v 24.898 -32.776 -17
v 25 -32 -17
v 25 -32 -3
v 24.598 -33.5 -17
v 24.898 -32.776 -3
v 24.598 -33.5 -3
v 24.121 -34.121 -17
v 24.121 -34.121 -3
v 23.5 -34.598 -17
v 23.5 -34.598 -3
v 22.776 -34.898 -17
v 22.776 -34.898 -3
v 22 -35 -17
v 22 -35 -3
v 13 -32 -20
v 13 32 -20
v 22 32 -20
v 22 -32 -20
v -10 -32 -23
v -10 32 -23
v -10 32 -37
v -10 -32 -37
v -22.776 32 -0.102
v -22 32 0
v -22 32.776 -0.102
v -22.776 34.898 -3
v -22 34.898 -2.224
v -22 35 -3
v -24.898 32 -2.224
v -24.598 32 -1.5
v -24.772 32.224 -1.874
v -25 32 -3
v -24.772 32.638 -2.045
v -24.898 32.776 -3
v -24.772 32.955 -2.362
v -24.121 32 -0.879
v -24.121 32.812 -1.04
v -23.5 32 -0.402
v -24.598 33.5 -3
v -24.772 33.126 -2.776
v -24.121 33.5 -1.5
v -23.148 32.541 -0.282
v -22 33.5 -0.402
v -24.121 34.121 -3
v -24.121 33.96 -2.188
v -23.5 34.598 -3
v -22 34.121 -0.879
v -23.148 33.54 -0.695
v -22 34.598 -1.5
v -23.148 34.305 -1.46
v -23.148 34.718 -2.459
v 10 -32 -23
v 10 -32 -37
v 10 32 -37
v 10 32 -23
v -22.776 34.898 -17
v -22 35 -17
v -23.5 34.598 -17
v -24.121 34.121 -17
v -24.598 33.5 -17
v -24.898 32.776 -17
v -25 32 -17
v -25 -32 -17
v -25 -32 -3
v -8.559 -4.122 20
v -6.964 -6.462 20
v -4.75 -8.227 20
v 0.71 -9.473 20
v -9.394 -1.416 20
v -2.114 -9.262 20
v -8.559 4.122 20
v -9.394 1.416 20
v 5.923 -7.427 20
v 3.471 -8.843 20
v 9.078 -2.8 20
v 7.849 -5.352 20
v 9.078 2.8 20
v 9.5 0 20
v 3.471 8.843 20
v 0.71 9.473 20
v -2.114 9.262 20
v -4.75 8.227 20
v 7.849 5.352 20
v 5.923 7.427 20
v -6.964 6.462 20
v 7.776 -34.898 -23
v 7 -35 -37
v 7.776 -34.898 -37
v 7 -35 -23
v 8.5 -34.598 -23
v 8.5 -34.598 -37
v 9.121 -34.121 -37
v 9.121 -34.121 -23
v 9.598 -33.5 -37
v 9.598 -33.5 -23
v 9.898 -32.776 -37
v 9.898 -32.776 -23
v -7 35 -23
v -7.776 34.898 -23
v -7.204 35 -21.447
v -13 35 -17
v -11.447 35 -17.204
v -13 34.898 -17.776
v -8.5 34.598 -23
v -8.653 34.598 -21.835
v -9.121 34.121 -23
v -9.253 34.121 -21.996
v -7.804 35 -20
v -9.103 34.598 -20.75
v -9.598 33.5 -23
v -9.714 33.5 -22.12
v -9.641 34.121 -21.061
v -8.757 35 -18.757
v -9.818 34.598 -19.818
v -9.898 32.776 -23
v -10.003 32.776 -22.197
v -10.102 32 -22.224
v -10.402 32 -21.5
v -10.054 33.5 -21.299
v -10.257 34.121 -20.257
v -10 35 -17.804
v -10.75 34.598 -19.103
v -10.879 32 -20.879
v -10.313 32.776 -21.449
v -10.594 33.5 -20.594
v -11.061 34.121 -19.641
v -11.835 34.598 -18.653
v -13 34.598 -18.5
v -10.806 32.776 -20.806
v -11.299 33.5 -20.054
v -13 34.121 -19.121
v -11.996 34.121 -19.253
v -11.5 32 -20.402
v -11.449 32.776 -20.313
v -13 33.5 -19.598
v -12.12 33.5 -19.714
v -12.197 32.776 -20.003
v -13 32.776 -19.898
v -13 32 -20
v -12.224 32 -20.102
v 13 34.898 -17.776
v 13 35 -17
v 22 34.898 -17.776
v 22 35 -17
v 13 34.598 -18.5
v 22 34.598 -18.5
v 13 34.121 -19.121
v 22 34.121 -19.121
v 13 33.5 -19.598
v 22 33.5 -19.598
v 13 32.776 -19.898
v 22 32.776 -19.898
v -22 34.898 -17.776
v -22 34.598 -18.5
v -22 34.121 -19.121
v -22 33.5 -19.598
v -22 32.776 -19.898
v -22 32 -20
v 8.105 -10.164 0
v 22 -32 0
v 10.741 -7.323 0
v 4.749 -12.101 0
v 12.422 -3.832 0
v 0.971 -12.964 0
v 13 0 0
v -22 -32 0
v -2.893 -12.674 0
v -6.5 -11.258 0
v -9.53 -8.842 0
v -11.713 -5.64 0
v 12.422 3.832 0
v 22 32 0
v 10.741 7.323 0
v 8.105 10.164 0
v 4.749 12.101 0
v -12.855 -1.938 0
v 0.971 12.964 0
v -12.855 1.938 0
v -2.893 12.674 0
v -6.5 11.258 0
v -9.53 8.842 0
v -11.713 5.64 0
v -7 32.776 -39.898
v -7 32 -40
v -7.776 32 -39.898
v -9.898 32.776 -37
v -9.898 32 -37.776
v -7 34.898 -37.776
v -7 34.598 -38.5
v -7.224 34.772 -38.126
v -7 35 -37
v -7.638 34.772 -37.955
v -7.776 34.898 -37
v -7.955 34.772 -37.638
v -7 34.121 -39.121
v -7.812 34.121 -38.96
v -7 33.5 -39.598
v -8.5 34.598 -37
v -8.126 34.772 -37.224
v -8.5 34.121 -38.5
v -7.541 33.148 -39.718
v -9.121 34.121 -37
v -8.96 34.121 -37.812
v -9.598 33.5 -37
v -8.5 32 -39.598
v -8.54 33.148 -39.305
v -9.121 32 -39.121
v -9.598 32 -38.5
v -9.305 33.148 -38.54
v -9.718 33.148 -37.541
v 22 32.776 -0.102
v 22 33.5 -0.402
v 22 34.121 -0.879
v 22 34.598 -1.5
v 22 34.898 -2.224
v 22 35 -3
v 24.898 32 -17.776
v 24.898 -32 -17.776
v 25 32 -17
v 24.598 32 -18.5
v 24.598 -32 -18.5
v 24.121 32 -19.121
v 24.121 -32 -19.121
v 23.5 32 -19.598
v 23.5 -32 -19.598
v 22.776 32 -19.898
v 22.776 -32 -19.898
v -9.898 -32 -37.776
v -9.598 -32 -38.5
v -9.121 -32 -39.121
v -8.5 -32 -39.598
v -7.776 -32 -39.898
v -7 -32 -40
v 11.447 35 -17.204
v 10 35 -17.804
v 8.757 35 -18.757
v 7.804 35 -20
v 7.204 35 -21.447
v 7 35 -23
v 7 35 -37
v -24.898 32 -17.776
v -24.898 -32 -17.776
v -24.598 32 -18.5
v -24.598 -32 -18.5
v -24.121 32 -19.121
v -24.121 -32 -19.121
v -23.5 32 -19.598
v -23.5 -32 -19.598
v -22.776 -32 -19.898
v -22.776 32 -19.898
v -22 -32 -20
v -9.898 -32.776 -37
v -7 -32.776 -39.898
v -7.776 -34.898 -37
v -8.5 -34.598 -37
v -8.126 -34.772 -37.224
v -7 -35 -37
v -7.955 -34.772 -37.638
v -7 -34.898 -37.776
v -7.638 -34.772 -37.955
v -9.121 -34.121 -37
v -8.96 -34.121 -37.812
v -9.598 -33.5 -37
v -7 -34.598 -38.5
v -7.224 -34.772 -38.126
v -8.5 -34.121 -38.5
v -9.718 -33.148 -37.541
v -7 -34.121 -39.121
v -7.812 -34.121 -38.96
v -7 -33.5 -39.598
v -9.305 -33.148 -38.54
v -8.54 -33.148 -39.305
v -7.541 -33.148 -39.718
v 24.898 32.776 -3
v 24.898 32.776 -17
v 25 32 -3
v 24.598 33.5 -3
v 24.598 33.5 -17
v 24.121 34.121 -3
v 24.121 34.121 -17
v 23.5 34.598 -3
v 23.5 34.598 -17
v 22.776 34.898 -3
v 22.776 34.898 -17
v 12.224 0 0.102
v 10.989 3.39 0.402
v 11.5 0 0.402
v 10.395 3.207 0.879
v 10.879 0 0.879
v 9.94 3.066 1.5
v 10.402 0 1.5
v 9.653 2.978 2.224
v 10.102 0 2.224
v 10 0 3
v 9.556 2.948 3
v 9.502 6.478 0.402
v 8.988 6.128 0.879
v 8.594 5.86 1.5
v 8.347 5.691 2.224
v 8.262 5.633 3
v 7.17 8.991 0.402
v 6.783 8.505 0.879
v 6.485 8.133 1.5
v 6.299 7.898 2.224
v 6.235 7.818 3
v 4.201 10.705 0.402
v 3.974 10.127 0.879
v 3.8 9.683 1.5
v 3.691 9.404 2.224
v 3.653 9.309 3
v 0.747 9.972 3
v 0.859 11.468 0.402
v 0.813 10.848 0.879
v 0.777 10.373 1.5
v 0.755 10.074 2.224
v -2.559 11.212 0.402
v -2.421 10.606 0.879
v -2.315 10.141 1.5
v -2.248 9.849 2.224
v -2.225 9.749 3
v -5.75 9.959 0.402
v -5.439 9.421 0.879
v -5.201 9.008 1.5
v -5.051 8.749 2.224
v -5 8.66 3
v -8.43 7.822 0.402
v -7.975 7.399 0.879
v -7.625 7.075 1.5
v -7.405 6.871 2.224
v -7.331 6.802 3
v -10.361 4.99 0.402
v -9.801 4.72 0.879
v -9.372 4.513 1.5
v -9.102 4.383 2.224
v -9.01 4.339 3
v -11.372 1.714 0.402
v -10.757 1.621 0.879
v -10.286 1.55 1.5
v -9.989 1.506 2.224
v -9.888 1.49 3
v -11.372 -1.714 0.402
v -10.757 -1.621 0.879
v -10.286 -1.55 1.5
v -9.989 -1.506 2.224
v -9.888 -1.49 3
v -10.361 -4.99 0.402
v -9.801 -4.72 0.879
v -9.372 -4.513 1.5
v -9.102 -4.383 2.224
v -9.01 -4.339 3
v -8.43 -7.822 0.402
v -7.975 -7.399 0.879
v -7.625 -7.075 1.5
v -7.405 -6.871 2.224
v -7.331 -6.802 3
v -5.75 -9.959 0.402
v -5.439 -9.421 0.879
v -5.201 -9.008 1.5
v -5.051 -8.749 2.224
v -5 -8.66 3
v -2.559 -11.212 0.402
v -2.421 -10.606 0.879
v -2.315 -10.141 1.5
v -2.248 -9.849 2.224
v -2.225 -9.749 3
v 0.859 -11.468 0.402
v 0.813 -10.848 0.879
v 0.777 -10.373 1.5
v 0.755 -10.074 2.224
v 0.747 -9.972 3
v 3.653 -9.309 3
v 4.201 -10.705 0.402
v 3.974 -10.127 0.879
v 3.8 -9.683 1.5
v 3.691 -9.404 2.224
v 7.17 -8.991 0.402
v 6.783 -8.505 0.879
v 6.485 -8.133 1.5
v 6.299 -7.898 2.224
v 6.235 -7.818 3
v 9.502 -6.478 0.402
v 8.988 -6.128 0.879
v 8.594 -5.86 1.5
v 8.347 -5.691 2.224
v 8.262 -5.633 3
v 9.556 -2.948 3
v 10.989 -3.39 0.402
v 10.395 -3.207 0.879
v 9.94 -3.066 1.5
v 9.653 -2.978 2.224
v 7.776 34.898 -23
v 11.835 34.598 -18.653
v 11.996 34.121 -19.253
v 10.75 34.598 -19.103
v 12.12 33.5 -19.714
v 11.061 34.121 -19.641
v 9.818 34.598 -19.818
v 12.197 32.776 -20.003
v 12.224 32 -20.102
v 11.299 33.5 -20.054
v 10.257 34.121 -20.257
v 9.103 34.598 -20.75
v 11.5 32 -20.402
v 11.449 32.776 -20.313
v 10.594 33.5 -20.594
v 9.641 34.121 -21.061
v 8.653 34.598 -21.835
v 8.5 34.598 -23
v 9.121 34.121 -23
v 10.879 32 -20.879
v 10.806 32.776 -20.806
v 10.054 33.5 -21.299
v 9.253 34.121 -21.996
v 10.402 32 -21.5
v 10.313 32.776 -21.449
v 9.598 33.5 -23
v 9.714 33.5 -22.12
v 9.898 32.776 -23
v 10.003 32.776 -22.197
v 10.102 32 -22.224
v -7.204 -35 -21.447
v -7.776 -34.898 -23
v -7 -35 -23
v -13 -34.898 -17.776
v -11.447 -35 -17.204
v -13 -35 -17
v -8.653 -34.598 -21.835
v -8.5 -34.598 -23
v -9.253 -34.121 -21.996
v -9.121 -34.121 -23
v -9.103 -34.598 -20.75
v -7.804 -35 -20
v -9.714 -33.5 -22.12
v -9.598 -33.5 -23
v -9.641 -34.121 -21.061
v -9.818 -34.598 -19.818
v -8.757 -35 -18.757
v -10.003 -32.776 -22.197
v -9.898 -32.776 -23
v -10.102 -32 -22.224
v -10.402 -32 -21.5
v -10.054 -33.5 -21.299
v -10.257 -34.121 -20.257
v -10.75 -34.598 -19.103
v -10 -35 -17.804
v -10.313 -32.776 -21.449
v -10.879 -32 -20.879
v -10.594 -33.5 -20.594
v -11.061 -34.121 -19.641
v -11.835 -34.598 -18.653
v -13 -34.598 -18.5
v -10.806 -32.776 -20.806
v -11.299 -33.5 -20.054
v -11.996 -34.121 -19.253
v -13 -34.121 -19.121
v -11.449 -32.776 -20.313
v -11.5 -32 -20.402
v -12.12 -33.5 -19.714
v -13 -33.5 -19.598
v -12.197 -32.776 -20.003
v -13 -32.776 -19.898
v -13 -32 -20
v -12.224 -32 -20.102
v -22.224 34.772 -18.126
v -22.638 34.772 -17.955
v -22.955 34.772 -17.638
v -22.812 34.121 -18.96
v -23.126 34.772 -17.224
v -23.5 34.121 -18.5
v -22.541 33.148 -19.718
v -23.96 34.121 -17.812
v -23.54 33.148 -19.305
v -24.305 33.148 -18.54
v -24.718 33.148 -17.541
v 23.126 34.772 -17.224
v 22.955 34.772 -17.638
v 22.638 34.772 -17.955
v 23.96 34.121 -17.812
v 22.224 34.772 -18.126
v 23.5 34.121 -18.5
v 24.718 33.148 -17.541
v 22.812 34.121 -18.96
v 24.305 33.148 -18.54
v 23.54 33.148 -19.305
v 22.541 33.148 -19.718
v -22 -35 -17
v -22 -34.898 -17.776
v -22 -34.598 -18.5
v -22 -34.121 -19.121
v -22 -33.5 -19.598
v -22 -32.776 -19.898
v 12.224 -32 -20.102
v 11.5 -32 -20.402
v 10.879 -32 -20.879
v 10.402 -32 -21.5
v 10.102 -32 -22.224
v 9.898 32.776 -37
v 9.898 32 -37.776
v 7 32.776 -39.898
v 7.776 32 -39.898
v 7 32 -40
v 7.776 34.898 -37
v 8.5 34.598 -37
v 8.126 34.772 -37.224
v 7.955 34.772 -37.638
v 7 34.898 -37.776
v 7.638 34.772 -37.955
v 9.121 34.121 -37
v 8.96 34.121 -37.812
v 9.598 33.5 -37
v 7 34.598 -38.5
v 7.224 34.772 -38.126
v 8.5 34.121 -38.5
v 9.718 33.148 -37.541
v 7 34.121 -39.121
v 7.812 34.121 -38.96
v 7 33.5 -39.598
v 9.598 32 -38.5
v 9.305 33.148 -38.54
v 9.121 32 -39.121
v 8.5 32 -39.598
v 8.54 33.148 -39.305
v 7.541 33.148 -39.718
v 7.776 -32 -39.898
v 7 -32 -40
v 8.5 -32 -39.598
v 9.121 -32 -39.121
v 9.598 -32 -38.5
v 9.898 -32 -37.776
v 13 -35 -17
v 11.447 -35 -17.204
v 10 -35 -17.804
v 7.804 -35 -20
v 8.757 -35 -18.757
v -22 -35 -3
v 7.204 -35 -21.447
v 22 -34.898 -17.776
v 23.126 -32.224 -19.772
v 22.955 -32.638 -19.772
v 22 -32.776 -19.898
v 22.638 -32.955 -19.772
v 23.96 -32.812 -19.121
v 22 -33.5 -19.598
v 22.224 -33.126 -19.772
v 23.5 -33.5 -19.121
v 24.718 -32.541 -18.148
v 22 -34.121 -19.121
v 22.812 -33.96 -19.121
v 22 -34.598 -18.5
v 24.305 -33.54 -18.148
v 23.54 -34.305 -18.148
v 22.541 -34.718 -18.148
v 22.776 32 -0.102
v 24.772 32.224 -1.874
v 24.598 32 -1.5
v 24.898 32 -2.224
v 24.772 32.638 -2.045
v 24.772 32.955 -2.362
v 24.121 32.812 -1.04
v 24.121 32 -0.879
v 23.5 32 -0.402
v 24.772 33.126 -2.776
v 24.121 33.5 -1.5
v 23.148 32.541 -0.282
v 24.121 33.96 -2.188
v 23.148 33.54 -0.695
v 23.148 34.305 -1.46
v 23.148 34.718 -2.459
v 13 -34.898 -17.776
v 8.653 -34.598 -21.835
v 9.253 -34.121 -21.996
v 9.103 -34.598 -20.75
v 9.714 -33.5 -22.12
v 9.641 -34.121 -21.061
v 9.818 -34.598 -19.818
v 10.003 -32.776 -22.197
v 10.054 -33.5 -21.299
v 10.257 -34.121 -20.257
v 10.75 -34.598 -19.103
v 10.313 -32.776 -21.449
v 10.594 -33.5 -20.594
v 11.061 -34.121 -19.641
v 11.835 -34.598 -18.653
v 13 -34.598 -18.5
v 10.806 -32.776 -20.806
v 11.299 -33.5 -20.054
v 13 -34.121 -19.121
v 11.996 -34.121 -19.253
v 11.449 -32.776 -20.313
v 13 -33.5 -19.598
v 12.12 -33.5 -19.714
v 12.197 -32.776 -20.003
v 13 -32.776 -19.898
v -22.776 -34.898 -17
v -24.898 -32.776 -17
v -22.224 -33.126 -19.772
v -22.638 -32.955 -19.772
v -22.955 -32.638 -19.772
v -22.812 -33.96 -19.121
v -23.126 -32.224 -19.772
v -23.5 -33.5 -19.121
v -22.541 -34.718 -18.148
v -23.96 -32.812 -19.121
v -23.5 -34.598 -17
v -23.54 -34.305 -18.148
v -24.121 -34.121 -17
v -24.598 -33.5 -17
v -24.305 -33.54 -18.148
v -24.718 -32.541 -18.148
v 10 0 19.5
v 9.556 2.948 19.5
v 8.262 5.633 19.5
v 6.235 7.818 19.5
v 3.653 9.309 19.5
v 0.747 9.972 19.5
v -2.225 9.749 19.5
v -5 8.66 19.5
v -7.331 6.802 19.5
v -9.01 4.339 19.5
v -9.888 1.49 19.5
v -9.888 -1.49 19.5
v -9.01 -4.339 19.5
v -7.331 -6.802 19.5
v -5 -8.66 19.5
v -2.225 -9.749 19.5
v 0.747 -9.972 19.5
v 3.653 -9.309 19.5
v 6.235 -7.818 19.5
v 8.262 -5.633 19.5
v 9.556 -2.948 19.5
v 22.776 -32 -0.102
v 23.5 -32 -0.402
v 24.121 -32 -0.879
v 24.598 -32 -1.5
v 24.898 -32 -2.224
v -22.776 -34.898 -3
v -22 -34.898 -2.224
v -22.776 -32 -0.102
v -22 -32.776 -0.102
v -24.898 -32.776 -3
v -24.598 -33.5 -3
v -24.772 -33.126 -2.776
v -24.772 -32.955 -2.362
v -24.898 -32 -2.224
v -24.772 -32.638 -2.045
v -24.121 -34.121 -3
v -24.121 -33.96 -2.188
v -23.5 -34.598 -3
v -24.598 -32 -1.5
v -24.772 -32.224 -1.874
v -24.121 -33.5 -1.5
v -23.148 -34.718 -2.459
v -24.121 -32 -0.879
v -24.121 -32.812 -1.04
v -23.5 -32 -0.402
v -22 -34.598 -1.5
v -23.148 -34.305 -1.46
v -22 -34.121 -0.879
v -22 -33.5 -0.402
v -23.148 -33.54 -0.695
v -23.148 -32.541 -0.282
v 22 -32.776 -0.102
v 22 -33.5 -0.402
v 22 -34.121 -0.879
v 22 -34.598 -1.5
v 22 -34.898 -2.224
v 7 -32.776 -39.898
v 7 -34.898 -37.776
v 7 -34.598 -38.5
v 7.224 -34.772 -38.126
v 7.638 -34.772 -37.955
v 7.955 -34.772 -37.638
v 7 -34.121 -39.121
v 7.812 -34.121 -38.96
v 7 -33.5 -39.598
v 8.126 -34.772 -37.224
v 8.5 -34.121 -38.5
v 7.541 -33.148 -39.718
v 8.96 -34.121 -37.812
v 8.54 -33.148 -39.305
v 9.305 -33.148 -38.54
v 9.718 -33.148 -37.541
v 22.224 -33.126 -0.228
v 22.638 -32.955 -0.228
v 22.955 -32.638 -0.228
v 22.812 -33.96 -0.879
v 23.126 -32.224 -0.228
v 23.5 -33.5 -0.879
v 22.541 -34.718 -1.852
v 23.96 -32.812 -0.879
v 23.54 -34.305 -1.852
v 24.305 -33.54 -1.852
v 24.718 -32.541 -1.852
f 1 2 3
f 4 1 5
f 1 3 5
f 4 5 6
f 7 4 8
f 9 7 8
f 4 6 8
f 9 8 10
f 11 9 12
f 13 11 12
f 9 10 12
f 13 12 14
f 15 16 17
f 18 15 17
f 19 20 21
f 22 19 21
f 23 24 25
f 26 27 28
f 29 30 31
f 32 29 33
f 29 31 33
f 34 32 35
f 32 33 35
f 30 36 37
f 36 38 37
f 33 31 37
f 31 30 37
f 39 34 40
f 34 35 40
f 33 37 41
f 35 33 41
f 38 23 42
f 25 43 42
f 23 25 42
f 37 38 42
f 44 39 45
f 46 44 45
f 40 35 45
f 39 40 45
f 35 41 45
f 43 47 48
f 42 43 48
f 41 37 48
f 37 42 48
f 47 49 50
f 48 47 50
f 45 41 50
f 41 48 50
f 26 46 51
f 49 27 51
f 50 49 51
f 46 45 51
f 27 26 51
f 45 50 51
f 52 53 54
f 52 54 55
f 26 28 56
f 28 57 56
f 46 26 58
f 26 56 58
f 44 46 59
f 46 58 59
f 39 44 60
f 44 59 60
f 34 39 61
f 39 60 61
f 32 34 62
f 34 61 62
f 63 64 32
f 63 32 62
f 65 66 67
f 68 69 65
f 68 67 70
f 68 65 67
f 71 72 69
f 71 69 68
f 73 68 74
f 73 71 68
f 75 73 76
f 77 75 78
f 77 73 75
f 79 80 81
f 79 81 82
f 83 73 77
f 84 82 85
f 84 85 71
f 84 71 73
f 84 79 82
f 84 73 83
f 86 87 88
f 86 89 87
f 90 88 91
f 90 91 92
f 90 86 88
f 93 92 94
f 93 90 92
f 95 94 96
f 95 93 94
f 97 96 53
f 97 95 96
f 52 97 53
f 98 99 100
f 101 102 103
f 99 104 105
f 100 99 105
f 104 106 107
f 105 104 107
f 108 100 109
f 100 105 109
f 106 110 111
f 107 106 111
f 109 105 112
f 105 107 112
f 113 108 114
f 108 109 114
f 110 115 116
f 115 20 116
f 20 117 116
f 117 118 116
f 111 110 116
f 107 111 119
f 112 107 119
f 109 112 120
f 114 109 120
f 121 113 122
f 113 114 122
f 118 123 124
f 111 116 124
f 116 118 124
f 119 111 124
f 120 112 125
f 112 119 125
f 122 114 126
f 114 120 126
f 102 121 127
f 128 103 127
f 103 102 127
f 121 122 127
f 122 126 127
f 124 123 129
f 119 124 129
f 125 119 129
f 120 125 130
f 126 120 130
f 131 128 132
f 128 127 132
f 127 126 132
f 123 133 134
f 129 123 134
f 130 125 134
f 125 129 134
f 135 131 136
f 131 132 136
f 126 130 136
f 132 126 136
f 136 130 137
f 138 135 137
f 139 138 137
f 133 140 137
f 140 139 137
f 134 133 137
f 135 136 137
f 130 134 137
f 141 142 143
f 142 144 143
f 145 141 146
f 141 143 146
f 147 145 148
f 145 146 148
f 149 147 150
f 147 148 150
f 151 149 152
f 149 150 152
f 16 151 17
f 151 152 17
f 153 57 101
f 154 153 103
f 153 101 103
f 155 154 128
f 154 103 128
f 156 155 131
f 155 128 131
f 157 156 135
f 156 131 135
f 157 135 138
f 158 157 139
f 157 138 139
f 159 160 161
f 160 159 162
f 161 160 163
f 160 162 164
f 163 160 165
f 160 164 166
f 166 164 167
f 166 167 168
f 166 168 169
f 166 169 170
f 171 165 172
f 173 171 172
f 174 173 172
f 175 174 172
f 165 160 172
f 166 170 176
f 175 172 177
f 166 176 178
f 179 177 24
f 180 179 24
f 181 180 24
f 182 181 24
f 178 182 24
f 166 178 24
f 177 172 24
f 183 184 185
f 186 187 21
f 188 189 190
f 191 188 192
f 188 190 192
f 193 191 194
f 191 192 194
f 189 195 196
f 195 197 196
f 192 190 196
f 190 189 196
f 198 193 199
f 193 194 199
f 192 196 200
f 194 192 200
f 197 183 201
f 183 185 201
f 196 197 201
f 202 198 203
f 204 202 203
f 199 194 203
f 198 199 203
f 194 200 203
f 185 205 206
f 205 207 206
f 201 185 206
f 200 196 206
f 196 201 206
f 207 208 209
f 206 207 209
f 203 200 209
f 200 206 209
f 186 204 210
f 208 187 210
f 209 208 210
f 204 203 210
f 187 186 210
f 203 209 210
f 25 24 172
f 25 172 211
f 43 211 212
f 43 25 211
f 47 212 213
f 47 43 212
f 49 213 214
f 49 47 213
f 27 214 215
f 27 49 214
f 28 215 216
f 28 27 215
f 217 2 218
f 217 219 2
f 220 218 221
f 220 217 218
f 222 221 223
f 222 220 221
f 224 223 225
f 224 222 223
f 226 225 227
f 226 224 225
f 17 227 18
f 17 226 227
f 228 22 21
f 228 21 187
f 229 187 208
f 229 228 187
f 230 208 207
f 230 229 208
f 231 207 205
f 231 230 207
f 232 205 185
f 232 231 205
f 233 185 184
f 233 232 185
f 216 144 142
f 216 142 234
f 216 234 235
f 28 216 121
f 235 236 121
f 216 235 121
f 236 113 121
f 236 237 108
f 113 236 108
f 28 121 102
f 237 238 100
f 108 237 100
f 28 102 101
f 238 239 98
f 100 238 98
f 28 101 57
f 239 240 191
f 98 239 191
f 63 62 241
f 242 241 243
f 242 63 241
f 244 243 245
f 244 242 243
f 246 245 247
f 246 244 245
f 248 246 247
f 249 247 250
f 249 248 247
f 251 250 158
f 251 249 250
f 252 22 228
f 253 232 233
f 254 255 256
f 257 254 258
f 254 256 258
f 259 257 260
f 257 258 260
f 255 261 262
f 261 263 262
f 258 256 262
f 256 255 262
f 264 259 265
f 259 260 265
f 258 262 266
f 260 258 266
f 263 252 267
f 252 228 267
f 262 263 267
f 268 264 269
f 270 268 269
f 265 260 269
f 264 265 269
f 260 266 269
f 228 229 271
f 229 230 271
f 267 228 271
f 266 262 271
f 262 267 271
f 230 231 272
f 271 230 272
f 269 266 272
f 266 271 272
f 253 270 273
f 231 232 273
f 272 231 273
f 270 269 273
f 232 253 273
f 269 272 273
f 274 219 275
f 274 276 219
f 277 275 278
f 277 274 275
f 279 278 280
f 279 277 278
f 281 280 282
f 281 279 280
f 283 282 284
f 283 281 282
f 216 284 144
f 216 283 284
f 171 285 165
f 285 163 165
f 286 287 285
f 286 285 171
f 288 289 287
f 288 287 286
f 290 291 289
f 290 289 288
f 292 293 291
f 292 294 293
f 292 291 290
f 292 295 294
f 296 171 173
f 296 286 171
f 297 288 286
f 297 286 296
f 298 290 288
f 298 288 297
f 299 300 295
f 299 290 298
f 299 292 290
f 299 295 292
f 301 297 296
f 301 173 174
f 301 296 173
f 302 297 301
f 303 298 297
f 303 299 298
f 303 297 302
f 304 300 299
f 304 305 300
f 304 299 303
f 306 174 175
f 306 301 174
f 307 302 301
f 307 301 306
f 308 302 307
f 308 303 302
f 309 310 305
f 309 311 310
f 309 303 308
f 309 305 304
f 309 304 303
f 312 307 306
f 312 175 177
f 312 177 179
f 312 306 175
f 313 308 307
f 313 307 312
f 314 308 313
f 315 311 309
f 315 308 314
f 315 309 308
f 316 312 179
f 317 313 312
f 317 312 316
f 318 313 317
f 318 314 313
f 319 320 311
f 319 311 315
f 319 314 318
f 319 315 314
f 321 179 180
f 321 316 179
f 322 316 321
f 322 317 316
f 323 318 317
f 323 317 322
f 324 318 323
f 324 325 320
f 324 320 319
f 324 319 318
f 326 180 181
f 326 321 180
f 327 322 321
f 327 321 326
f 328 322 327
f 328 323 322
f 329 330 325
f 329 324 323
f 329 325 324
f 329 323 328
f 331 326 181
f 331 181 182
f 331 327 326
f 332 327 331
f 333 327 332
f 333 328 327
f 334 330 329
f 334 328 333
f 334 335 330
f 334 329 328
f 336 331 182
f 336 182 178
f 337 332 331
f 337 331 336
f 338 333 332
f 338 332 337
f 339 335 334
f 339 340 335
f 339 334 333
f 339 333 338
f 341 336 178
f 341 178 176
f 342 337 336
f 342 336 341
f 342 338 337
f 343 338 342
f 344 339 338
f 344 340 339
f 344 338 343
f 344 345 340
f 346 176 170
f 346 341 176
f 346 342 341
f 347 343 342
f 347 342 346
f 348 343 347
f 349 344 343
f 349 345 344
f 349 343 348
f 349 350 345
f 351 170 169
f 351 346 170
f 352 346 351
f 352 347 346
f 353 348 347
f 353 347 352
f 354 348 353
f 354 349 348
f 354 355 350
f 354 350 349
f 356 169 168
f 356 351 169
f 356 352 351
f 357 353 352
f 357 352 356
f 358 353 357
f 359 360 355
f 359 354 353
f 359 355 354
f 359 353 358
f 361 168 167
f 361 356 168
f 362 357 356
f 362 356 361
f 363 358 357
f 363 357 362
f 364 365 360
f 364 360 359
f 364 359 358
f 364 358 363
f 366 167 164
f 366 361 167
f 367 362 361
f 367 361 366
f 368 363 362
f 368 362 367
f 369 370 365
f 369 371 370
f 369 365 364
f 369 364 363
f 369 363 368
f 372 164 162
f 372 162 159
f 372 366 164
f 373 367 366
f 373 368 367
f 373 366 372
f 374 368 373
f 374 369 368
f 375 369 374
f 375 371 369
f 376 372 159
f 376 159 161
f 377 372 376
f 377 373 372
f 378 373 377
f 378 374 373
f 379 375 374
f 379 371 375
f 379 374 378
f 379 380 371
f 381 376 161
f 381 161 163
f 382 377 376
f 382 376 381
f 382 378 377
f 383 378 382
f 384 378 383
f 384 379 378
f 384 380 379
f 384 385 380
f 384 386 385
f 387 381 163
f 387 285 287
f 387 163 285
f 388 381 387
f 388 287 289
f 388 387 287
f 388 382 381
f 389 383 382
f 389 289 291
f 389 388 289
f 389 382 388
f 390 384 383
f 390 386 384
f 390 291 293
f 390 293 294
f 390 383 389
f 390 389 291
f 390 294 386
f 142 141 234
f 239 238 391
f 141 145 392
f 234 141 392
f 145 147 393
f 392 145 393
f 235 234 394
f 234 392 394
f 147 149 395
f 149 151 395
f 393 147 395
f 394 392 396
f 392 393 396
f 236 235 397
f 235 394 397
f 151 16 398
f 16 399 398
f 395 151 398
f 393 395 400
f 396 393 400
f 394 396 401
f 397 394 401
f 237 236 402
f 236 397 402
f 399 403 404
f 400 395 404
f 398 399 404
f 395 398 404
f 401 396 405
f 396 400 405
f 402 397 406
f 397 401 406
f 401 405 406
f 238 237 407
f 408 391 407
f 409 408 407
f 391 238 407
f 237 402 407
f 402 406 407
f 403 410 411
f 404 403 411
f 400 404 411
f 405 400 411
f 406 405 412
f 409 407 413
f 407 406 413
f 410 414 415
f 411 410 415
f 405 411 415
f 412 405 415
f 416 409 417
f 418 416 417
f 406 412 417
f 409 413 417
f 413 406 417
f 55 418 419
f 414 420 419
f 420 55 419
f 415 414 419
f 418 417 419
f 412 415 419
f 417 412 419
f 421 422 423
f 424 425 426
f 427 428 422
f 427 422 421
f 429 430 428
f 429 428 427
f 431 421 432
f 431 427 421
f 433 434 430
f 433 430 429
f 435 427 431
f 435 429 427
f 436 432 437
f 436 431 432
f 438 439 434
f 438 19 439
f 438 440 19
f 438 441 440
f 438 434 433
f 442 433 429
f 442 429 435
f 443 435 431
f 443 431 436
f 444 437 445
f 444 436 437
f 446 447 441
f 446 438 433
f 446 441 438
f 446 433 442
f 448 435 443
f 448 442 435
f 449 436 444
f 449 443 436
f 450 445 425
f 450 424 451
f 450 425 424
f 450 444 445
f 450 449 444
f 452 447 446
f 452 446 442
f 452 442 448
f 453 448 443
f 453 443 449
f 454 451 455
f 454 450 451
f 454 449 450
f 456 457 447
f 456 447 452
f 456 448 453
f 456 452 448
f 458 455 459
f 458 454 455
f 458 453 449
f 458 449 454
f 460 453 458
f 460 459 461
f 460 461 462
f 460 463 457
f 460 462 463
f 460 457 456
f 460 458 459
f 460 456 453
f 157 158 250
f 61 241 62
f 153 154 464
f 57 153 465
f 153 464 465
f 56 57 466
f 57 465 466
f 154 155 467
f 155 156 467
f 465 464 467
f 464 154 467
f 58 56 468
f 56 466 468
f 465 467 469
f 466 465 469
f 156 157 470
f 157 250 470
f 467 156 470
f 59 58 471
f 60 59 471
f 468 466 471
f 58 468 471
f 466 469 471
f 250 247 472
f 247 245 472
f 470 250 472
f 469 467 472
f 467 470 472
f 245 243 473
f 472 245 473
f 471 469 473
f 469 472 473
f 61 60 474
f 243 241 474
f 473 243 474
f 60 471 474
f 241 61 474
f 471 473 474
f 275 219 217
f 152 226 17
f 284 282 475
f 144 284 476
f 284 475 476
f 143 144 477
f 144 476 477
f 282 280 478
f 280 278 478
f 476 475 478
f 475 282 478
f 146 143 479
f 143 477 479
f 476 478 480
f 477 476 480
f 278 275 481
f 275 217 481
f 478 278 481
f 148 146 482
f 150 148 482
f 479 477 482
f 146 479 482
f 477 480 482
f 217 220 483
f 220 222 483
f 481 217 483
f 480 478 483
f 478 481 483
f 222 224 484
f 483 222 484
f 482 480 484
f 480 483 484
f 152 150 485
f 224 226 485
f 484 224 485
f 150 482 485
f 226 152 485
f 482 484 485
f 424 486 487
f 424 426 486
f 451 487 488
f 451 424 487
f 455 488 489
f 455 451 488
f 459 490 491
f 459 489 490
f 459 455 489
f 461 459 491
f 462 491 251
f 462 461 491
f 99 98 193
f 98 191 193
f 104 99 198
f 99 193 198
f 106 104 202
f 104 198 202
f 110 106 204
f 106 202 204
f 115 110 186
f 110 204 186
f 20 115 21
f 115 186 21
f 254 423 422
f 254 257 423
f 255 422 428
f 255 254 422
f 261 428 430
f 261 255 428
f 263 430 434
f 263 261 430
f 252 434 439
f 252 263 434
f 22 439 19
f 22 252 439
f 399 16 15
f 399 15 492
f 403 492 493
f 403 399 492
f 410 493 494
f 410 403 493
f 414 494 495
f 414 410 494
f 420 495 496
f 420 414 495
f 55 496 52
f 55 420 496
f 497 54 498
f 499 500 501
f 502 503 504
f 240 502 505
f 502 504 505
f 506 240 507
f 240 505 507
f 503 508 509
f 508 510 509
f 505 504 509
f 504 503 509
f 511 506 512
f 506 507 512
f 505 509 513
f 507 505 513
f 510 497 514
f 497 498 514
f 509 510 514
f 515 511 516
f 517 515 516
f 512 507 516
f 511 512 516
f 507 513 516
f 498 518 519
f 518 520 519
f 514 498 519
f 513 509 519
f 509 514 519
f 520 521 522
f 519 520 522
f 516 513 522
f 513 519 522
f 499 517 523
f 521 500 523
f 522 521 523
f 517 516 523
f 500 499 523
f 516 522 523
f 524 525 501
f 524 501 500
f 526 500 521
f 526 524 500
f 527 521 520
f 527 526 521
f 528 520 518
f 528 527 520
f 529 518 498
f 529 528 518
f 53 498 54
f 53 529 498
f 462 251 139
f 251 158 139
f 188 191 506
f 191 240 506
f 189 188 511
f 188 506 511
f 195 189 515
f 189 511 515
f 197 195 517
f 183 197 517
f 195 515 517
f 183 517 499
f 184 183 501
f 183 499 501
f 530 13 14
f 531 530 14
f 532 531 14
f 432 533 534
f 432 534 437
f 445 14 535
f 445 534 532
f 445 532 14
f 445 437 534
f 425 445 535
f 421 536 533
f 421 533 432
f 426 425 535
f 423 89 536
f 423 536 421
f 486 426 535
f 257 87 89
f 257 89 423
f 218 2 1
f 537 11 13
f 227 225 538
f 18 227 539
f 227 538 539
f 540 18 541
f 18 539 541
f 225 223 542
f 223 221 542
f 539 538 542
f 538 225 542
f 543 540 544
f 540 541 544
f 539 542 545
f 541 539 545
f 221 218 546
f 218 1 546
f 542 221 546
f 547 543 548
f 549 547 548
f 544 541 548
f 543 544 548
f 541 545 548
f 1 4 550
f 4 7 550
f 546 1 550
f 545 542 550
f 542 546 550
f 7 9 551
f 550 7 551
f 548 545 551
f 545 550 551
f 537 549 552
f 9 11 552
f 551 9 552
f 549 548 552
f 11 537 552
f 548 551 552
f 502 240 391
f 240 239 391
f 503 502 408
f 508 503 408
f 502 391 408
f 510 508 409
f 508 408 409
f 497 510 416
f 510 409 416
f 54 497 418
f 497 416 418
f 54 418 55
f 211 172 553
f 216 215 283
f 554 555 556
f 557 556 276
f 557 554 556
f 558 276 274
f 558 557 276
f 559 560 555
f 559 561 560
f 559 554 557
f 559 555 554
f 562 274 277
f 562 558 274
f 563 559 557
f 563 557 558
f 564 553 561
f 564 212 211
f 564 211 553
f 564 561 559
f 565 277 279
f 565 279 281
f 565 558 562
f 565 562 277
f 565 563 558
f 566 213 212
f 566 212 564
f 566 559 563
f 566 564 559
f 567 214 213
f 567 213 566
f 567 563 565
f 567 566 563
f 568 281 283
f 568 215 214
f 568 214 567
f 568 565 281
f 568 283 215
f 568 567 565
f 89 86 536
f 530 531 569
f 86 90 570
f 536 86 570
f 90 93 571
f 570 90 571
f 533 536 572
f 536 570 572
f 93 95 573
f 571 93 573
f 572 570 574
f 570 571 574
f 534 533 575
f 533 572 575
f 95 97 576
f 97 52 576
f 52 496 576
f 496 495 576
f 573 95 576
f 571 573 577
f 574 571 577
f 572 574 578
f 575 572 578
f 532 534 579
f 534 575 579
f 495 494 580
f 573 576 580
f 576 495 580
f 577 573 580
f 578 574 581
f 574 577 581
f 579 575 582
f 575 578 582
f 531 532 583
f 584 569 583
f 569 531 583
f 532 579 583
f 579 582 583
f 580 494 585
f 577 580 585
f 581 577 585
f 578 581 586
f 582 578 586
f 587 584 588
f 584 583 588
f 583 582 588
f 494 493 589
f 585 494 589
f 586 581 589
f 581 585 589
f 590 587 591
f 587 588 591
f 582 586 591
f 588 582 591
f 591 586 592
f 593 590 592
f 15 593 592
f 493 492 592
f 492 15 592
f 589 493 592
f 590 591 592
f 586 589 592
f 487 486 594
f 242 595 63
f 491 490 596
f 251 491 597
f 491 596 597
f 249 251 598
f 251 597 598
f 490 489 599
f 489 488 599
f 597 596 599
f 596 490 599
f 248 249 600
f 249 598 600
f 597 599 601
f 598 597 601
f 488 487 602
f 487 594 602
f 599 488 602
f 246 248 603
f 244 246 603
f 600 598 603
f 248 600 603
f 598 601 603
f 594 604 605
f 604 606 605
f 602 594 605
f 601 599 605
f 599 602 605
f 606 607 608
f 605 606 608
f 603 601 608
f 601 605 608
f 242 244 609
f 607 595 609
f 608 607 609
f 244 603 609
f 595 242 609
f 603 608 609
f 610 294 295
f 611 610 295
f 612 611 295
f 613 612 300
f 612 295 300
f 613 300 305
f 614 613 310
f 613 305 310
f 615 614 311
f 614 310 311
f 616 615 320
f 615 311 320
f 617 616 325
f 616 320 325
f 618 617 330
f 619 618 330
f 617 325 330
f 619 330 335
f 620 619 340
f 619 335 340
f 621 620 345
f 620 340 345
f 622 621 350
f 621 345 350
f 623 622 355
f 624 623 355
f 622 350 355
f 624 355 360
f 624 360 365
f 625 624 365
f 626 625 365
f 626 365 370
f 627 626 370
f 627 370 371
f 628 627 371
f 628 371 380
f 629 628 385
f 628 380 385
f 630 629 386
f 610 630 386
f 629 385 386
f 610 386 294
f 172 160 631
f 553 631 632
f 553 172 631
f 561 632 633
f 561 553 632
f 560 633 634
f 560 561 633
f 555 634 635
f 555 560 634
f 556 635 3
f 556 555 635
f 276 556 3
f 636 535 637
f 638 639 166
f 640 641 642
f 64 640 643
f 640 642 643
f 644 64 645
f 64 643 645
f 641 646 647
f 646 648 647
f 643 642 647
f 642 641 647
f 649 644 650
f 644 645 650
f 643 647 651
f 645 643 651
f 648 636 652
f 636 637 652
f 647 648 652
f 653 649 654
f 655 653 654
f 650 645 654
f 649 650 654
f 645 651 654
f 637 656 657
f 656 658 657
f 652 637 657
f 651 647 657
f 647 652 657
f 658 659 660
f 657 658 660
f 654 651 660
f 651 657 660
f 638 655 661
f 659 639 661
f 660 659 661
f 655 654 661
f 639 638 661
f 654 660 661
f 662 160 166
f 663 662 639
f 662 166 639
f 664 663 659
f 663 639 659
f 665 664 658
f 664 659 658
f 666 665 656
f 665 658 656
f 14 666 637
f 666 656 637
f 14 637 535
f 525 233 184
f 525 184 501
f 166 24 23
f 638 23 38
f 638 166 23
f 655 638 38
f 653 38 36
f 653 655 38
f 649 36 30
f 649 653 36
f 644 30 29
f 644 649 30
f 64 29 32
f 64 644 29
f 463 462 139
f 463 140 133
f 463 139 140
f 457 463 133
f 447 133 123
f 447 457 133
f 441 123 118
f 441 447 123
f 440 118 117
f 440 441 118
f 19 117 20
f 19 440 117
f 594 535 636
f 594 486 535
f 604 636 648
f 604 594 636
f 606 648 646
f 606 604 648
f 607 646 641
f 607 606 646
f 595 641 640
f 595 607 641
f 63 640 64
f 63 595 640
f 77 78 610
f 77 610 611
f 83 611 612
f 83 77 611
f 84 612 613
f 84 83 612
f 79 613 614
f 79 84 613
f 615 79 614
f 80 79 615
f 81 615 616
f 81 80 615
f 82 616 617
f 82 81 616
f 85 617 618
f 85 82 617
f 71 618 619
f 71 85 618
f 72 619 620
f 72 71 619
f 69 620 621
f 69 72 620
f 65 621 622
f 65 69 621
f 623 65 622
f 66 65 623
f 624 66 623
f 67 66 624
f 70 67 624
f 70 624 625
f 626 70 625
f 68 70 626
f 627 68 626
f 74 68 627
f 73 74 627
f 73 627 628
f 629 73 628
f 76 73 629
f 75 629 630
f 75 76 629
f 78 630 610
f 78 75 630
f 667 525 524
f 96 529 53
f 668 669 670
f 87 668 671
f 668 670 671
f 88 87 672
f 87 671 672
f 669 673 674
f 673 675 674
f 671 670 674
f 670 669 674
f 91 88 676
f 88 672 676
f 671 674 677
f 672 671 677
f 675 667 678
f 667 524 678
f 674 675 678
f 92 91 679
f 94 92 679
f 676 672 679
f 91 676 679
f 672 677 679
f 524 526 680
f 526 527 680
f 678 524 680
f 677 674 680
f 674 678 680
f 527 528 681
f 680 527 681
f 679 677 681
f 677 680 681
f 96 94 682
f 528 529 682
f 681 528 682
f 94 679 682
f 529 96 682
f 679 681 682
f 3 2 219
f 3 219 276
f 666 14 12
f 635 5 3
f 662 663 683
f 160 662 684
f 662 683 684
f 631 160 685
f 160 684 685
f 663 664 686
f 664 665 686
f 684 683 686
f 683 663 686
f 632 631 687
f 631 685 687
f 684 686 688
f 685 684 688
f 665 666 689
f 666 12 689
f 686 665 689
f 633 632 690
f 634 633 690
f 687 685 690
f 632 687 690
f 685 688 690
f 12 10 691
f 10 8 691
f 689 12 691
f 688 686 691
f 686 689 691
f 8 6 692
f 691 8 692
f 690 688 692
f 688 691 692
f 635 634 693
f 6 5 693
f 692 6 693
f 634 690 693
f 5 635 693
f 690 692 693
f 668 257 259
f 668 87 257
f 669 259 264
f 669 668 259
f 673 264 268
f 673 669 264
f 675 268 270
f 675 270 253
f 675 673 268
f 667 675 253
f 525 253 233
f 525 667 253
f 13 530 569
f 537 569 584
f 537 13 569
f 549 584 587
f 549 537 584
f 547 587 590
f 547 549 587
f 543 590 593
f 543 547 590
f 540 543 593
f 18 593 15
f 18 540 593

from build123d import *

# Parameters (mm, degrees)
BOSS_EXTRUDE1_DEPTH = 35
SKETCH2_R           = 10
BOSS_EXTRUDE2_DEPTH = 20
FILLET1_R           = 3
CHAMFER1_SIZE       = 0.5


with BuildPart() as part:
    # Sketch1 → Boss-Extrude1 (new, symmetric)
    with BuildSketch(Plane(origin=(0, 0, 0), x_dir=(1, 0, 0), z_dir=(0, 1, 0))):
        Polygon((25, 0), (-25, 0), (-25, 20), (-10, 20), (-10, 40), (10, 40), (10, 20), (25, 20), align=None)
    extrude(amount=BOSS_EXTRUDE1_DEPTH, both=True)

    # Sketch2 → Boss-Extrude2 (add)
    with BuildSketch(Plane.XY):
        Circle(SKETCH2_R)
    extrude(amount=BOSS_EXTRUDE2_DEPTH)

    # Fillet1
    fillet1_edges = [part.edges().sort_by_distance(p)[0] for p in [
        (25, -35, -10),
        (0, -35, 0),
        (-25, -35, -10),
        (-17.5, -35, -20),
        (0, 35, 0),
        (-10, 0, -20),
        (-10, 0, -40),
        (10, 0, -40),
        (10, 0, -20),
        (25, 0, -20),
        (25, 0, 0),
        (-25, 0, 0),
        (-25, 0, -20),
        (25, 35, -10),
        (17.5, 35, -20),
        (-10, 0, 0),
        (10, 35, -30),
        (0, 35, -40),
        (-10, 35, -30),
        (-17.5, 35, -20),
        (-10, -35, -30),
        (-25, 35, -10),
        (0, -35, -40),
        (10, -35, -30),
        (17.5, -35, -20),
    ]]
    fillet(fillet1_edges, radius=FILLET1_R)

    # Chamfer1
    chamfer1_edges = [part.edges().sort_by_distance(p)[0] for p in [
        (-10, 0, 20),
    ]]
    chamfer(chamfer1_edges, length=CHAMFER1_SIZE)


solid = part.part
